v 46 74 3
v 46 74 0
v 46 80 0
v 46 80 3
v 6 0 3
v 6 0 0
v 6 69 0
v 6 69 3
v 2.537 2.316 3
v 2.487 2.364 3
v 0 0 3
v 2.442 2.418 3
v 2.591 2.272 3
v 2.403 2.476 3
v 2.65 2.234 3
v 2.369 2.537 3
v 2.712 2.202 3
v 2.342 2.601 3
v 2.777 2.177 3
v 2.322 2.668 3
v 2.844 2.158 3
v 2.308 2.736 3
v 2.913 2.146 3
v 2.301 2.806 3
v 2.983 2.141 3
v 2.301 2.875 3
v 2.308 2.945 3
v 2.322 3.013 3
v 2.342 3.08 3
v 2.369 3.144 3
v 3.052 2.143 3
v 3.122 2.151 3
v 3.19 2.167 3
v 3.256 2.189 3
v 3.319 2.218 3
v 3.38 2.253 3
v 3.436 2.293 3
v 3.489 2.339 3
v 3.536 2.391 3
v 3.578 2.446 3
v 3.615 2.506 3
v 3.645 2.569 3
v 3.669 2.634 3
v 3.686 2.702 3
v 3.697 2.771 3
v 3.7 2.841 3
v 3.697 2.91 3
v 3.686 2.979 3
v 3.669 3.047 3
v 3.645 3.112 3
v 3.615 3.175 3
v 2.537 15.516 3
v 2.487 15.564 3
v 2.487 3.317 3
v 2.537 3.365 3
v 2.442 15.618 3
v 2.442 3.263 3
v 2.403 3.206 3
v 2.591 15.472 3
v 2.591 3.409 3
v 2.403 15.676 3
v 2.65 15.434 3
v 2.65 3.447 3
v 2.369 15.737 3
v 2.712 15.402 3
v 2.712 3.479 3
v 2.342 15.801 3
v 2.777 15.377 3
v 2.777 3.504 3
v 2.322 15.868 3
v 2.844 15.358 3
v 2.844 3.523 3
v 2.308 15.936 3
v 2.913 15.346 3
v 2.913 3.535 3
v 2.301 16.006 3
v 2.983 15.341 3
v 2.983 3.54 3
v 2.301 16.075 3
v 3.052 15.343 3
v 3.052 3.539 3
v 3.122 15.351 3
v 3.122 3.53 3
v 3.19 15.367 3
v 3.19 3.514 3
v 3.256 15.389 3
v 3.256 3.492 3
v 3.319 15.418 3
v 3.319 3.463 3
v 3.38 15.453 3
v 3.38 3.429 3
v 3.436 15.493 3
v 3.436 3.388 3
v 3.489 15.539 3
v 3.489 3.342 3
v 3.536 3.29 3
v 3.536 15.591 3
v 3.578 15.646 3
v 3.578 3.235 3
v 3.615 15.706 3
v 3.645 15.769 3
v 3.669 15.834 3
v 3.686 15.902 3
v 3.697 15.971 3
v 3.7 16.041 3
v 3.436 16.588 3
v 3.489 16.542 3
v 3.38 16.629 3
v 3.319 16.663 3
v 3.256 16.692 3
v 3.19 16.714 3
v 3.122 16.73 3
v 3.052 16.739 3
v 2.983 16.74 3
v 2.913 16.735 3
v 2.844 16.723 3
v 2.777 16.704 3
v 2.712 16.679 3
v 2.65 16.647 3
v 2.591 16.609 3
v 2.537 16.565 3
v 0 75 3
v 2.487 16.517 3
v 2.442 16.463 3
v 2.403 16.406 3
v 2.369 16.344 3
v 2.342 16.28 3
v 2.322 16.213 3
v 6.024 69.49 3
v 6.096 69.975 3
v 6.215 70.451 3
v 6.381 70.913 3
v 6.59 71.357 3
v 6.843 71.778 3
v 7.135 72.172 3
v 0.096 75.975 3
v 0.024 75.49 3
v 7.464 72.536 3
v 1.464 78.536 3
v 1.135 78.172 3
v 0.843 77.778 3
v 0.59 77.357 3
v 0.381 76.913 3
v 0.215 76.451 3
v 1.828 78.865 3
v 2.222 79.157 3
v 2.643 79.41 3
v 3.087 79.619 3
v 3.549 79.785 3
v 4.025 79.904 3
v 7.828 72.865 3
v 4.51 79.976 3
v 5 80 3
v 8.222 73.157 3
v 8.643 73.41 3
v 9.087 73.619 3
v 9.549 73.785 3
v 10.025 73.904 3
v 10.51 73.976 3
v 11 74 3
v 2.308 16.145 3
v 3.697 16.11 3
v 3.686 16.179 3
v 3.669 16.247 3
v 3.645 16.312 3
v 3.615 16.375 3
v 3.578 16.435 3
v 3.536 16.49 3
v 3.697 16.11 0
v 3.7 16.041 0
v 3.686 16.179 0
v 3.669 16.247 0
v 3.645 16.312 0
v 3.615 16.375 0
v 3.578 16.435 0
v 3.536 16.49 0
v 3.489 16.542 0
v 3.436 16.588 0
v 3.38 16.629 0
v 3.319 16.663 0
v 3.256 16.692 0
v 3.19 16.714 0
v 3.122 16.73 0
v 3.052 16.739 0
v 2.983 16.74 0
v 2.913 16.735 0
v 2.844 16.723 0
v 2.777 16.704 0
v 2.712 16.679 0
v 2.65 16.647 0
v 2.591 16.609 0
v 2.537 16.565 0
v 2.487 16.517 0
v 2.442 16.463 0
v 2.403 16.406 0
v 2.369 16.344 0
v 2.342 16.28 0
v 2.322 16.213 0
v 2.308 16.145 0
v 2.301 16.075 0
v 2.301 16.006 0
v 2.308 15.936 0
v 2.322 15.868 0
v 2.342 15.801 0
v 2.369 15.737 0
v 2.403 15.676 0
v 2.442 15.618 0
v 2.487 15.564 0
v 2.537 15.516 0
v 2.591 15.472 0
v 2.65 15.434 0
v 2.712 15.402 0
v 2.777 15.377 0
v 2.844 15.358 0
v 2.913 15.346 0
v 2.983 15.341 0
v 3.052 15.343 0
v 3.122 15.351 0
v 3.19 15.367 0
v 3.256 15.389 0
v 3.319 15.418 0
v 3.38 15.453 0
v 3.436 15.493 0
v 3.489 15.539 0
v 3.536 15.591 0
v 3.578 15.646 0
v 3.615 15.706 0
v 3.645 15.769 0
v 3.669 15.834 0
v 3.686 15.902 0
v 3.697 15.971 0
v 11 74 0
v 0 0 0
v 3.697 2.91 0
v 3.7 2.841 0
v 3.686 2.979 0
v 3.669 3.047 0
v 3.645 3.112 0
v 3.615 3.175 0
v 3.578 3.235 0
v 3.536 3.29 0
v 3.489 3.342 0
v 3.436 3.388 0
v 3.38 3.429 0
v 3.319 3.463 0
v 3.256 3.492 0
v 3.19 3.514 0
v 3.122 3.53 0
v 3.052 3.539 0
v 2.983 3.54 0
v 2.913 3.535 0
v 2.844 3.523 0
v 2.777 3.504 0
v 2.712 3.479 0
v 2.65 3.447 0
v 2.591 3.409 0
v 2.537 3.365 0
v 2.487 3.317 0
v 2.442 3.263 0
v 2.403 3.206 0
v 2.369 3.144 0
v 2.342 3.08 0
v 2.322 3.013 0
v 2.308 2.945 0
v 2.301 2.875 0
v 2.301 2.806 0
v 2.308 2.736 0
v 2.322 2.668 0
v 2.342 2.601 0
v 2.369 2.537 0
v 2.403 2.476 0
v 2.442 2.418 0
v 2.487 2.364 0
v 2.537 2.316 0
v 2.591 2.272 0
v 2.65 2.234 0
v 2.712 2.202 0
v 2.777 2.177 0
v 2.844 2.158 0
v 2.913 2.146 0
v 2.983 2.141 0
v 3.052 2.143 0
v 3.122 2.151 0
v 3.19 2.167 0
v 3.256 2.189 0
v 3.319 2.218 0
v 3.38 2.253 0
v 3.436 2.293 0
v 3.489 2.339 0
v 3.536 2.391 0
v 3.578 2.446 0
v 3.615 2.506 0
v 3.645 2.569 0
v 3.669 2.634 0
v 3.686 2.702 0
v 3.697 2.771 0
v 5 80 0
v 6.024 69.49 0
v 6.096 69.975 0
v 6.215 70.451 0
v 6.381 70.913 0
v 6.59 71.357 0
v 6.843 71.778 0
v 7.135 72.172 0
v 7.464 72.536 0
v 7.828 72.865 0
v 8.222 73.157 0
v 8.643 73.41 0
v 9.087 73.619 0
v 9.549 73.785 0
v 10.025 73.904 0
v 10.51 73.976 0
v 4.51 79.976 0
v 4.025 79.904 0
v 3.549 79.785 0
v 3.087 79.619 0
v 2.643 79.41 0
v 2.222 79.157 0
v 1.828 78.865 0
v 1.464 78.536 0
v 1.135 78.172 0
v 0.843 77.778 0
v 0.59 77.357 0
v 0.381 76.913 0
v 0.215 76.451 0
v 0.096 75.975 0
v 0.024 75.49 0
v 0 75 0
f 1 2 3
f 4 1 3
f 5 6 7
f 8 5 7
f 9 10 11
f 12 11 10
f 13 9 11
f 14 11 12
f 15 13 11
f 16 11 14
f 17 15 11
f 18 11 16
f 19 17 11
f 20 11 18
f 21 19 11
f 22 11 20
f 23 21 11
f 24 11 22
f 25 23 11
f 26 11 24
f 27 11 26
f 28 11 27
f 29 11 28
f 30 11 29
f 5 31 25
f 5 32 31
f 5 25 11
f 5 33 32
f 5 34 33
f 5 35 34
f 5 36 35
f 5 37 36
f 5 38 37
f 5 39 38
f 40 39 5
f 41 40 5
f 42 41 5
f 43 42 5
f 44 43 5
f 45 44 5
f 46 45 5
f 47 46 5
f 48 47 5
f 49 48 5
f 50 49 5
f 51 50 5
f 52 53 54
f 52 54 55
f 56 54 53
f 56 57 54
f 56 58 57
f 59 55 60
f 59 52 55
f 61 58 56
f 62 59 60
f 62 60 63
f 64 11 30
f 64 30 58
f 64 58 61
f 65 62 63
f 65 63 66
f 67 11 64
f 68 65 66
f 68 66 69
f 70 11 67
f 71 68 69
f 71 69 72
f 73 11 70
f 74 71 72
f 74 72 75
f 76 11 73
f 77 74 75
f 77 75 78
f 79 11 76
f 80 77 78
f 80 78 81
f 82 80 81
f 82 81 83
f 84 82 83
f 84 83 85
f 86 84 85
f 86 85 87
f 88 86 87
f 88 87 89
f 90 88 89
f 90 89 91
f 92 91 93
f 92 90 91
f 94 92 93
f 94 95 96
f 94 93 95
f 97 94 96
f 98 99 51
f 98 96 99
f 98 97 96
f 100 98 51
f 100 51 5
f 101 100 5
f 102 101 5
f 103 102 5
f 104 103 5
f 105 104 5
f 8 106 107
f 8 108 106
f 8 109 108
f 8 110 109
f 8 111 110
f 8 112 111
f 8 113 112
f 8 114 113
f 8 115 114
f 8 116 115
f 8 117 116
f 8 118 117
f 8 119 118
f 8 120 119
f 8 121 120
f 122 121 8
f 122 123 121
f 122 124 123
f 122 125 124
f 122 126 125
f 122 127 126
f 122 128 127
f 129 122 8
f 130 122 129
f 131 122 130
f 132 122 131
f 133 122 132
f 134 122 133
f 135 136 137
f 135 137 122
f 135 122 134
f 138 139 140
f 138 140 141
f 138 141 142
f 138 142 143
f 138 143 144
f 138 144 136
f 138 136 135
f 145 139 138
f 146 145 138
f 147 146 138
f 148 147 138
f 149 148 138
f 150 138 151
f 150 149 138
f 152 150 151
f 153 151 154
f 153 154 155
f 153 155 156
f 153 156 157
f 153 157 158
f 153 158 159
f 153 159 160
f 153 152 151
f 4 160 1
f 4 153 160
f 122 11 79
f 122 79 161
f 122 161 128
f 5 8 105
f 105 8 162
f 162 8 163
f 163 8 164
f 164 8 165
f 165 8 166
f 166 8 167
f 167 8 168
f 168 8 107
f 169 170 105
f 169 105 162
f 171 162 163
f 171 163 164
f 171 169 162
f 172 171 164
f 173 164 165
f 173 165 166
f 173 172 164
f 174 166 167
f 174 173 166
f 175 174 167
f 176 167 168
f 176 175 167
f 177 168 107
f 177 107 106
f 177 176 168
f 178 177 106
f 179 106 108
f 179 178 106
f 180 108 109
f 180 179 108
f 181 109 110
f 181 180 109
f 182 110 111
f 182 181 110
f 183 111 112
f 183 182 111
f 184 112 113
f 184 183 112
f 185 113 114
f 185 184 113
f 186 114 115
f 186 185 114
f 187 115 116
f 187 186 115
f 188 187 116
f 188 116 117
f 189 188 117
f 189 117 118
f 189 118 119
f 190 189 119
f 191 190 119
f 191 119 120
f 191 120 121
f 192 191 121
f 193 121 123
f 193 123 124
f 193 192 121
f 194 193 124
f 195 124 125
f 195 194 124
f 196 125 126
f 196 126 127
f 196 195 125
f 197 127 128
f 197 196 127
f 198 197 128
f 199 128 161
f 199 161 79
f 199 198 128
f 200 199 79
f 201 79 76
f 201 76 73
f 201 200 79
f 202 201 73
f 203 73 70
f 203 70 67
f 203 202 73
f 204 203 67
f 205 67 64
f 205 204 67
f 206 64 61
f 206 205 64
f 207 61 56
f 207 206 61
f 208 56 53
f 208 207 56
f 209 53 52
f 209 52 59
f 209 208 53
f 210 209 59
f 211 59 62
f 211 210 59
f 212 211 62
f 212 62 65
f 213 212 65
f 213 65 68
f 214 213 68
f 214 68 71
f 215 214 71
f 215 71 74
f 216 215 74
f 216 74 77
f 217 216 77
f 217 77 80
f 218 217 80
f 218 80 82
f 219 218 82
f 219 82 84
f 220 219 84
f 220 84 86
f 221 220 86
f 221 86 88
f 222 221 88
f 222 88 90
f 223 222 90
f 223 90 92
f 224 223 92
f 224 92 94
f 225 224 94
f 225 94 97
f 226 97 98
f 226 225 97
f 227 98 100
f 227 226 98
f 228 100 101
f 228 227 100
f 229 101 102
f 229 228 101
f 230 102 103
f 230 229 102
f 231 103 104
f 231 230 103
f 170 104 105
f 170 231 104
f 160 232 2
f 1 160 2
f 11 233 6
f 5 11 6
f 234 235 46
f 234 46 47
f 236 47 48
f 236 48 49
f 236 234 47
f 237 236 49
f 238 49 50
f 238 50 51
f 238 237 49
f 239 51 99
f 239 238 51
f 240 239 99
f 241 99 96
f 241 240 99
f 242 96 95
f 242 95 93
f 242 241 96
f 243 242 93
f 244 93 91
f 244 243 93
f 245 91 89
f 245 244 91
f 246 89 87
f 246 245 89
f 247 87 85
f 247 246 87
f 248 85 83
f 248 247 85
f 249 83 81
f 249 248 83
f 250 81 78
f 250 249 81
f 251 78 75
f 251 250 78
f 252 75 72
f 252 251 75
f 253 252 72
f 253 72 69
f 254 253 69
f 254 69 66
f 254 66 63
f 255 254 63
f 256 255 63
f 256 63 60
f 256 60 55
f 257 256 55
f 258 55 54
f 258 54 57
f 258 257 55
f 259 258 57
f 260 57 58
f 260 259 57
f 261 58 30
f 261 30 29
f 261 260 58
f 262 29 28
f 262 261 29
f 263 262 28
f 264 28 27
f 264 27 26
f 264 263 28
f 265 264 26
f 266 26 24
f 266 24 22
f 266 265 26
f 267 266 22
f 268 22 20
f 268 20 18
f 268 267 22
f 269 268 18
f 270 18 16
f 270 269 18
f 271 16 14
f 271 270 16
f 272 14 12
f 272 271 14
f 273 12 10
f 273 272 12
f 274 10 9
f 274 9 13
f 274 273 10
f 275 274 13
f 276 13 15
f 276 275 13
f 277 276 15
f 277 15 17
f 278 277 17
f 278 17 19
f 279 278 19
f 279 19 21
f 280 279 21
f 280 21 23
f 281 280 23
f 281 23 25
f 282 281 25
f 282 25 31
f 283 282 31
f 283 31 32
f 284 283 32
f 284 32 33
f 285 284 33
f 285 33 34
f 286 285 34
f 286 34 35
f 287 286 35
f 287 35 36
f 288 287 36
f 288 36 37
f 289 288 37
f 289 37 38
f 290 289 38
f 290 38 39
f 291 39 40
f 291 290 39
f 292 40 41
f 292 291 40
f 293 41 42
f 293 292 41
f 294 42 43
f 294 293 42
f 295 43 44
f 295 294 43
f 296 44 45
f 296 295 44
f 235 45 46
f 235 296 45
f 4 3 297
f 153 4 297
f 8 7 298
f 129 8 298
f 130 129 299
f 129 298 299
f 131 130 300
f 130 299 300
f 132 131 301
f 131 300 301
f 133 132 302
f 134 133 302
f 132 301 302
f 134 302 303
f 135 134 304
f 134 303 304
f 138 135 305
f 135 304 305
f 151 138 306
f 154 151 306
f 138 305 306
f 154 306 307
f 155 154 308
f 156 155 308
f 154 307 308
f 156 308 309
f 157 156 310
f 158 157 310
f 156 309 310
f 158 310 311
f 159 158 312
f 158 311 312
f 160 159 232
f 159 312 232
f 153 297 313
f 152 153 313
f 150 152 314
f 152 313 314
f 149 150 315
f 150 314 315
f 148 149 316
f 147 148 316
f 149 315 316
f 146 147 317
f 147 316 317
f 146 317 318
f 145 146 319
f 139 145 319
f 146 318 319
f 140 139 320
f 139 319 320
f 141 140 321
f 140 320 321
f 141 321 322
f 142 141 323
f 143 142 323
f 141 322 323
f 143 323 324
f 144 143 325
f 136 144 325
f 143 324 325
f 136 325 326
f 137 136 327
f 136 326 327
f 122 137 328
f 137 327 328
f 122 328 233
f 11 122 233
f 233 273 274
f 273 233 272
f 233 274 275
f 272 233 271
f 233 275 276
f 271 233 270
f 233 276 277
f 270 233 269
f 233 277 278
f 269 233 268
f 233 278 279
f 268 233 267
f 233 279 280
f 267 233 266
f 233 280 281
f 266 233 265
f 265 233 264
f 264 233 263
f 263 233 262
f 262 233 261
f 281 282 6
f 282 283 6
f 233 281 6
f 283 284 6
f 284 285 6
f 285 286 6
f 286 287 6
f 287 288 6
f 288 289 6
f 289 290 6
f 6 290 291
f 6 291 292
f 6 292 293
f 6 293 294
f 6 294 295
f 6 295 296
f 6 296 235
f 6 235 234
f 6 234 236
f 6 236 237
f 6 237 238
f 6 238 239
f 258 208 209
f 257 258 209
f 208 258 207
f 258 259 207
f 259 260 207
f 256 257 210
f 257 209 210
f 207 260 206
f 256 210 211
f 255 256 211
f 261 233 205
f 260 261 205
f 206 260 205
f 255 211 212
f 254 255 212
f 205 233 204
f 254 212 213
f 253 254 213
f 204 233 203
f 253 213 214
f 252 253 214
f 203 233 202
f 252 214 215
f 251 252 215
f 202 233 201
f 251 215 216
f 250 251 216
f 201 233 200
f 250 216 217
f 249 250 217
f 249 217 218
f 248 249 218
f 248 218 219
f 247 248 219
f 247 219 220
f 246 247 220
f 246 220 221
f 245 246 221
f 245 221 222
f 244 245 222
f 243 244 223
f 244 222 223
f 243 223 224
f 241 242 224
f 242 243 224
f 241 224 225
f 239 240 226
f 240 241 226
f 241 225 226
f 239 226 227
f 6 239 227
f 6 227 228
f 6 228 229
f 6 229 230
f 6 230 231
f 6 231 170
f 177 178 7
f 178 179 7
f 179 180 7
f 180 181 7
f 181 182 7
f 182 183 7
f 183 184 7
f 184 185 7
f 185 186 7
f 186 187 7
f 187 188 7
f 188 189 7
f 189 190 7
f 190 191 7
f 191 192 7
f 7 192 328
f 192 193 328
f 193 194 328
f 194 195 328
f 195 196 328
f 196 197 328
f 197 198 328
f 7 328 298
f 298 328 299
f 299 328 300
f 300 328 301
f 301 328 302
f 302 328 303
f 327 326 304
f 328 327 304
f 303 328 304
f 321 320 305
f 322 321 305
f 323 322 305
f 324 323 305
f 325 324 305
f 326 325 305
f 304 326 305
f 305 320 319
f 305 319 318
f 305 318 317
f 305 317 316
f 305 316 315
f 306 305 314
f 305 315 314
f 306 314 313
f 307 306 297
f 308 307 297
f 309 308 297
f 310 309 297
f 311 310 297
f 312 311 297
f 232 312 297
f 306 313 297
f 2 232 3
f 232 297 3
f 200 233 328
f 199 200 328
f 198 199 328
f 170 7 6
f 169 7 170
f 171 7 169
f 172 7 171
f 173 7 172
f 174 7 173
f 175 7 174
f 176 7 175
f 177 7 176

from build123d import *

# Parameters (mm, degrees)
F0_R     = 0.7
F1_DEPTH = 3


with BuildPart() as f1:
    # F0 (on Top) → F1 (new body)
    with BuildSketch(Plane.XY):
        with BuildLine():
            Line((0, 75), (0, 0))
            Line((0, 0), (6, 0))
            Line((6, 0), (6, 69))
            ThreePointArc((6, 69), (7.464466, 72.535534), (11, 74))
            Line((11, 74), (19.39934, 74))
            Line((19.39934, 74), (46, 74))
            Line((46, 74), (46, 80))
            Line((46, 80), (6, 80))
            Line((6, 80), (5, 80))
            ThreePointArc((5, 80), (1.464466, 78.535534), (0, 75))
        make_face()
        with Locations((3, 2.840546)):
            Circle(F0_R, mode=Mode.SUBTRACT)
        with Locations((3, 16.040546)):
            Circle(F0_R, mode=Mode.SUBTRACT)
    extrude(amount=F1_DEPTH)


solid = f1.part
